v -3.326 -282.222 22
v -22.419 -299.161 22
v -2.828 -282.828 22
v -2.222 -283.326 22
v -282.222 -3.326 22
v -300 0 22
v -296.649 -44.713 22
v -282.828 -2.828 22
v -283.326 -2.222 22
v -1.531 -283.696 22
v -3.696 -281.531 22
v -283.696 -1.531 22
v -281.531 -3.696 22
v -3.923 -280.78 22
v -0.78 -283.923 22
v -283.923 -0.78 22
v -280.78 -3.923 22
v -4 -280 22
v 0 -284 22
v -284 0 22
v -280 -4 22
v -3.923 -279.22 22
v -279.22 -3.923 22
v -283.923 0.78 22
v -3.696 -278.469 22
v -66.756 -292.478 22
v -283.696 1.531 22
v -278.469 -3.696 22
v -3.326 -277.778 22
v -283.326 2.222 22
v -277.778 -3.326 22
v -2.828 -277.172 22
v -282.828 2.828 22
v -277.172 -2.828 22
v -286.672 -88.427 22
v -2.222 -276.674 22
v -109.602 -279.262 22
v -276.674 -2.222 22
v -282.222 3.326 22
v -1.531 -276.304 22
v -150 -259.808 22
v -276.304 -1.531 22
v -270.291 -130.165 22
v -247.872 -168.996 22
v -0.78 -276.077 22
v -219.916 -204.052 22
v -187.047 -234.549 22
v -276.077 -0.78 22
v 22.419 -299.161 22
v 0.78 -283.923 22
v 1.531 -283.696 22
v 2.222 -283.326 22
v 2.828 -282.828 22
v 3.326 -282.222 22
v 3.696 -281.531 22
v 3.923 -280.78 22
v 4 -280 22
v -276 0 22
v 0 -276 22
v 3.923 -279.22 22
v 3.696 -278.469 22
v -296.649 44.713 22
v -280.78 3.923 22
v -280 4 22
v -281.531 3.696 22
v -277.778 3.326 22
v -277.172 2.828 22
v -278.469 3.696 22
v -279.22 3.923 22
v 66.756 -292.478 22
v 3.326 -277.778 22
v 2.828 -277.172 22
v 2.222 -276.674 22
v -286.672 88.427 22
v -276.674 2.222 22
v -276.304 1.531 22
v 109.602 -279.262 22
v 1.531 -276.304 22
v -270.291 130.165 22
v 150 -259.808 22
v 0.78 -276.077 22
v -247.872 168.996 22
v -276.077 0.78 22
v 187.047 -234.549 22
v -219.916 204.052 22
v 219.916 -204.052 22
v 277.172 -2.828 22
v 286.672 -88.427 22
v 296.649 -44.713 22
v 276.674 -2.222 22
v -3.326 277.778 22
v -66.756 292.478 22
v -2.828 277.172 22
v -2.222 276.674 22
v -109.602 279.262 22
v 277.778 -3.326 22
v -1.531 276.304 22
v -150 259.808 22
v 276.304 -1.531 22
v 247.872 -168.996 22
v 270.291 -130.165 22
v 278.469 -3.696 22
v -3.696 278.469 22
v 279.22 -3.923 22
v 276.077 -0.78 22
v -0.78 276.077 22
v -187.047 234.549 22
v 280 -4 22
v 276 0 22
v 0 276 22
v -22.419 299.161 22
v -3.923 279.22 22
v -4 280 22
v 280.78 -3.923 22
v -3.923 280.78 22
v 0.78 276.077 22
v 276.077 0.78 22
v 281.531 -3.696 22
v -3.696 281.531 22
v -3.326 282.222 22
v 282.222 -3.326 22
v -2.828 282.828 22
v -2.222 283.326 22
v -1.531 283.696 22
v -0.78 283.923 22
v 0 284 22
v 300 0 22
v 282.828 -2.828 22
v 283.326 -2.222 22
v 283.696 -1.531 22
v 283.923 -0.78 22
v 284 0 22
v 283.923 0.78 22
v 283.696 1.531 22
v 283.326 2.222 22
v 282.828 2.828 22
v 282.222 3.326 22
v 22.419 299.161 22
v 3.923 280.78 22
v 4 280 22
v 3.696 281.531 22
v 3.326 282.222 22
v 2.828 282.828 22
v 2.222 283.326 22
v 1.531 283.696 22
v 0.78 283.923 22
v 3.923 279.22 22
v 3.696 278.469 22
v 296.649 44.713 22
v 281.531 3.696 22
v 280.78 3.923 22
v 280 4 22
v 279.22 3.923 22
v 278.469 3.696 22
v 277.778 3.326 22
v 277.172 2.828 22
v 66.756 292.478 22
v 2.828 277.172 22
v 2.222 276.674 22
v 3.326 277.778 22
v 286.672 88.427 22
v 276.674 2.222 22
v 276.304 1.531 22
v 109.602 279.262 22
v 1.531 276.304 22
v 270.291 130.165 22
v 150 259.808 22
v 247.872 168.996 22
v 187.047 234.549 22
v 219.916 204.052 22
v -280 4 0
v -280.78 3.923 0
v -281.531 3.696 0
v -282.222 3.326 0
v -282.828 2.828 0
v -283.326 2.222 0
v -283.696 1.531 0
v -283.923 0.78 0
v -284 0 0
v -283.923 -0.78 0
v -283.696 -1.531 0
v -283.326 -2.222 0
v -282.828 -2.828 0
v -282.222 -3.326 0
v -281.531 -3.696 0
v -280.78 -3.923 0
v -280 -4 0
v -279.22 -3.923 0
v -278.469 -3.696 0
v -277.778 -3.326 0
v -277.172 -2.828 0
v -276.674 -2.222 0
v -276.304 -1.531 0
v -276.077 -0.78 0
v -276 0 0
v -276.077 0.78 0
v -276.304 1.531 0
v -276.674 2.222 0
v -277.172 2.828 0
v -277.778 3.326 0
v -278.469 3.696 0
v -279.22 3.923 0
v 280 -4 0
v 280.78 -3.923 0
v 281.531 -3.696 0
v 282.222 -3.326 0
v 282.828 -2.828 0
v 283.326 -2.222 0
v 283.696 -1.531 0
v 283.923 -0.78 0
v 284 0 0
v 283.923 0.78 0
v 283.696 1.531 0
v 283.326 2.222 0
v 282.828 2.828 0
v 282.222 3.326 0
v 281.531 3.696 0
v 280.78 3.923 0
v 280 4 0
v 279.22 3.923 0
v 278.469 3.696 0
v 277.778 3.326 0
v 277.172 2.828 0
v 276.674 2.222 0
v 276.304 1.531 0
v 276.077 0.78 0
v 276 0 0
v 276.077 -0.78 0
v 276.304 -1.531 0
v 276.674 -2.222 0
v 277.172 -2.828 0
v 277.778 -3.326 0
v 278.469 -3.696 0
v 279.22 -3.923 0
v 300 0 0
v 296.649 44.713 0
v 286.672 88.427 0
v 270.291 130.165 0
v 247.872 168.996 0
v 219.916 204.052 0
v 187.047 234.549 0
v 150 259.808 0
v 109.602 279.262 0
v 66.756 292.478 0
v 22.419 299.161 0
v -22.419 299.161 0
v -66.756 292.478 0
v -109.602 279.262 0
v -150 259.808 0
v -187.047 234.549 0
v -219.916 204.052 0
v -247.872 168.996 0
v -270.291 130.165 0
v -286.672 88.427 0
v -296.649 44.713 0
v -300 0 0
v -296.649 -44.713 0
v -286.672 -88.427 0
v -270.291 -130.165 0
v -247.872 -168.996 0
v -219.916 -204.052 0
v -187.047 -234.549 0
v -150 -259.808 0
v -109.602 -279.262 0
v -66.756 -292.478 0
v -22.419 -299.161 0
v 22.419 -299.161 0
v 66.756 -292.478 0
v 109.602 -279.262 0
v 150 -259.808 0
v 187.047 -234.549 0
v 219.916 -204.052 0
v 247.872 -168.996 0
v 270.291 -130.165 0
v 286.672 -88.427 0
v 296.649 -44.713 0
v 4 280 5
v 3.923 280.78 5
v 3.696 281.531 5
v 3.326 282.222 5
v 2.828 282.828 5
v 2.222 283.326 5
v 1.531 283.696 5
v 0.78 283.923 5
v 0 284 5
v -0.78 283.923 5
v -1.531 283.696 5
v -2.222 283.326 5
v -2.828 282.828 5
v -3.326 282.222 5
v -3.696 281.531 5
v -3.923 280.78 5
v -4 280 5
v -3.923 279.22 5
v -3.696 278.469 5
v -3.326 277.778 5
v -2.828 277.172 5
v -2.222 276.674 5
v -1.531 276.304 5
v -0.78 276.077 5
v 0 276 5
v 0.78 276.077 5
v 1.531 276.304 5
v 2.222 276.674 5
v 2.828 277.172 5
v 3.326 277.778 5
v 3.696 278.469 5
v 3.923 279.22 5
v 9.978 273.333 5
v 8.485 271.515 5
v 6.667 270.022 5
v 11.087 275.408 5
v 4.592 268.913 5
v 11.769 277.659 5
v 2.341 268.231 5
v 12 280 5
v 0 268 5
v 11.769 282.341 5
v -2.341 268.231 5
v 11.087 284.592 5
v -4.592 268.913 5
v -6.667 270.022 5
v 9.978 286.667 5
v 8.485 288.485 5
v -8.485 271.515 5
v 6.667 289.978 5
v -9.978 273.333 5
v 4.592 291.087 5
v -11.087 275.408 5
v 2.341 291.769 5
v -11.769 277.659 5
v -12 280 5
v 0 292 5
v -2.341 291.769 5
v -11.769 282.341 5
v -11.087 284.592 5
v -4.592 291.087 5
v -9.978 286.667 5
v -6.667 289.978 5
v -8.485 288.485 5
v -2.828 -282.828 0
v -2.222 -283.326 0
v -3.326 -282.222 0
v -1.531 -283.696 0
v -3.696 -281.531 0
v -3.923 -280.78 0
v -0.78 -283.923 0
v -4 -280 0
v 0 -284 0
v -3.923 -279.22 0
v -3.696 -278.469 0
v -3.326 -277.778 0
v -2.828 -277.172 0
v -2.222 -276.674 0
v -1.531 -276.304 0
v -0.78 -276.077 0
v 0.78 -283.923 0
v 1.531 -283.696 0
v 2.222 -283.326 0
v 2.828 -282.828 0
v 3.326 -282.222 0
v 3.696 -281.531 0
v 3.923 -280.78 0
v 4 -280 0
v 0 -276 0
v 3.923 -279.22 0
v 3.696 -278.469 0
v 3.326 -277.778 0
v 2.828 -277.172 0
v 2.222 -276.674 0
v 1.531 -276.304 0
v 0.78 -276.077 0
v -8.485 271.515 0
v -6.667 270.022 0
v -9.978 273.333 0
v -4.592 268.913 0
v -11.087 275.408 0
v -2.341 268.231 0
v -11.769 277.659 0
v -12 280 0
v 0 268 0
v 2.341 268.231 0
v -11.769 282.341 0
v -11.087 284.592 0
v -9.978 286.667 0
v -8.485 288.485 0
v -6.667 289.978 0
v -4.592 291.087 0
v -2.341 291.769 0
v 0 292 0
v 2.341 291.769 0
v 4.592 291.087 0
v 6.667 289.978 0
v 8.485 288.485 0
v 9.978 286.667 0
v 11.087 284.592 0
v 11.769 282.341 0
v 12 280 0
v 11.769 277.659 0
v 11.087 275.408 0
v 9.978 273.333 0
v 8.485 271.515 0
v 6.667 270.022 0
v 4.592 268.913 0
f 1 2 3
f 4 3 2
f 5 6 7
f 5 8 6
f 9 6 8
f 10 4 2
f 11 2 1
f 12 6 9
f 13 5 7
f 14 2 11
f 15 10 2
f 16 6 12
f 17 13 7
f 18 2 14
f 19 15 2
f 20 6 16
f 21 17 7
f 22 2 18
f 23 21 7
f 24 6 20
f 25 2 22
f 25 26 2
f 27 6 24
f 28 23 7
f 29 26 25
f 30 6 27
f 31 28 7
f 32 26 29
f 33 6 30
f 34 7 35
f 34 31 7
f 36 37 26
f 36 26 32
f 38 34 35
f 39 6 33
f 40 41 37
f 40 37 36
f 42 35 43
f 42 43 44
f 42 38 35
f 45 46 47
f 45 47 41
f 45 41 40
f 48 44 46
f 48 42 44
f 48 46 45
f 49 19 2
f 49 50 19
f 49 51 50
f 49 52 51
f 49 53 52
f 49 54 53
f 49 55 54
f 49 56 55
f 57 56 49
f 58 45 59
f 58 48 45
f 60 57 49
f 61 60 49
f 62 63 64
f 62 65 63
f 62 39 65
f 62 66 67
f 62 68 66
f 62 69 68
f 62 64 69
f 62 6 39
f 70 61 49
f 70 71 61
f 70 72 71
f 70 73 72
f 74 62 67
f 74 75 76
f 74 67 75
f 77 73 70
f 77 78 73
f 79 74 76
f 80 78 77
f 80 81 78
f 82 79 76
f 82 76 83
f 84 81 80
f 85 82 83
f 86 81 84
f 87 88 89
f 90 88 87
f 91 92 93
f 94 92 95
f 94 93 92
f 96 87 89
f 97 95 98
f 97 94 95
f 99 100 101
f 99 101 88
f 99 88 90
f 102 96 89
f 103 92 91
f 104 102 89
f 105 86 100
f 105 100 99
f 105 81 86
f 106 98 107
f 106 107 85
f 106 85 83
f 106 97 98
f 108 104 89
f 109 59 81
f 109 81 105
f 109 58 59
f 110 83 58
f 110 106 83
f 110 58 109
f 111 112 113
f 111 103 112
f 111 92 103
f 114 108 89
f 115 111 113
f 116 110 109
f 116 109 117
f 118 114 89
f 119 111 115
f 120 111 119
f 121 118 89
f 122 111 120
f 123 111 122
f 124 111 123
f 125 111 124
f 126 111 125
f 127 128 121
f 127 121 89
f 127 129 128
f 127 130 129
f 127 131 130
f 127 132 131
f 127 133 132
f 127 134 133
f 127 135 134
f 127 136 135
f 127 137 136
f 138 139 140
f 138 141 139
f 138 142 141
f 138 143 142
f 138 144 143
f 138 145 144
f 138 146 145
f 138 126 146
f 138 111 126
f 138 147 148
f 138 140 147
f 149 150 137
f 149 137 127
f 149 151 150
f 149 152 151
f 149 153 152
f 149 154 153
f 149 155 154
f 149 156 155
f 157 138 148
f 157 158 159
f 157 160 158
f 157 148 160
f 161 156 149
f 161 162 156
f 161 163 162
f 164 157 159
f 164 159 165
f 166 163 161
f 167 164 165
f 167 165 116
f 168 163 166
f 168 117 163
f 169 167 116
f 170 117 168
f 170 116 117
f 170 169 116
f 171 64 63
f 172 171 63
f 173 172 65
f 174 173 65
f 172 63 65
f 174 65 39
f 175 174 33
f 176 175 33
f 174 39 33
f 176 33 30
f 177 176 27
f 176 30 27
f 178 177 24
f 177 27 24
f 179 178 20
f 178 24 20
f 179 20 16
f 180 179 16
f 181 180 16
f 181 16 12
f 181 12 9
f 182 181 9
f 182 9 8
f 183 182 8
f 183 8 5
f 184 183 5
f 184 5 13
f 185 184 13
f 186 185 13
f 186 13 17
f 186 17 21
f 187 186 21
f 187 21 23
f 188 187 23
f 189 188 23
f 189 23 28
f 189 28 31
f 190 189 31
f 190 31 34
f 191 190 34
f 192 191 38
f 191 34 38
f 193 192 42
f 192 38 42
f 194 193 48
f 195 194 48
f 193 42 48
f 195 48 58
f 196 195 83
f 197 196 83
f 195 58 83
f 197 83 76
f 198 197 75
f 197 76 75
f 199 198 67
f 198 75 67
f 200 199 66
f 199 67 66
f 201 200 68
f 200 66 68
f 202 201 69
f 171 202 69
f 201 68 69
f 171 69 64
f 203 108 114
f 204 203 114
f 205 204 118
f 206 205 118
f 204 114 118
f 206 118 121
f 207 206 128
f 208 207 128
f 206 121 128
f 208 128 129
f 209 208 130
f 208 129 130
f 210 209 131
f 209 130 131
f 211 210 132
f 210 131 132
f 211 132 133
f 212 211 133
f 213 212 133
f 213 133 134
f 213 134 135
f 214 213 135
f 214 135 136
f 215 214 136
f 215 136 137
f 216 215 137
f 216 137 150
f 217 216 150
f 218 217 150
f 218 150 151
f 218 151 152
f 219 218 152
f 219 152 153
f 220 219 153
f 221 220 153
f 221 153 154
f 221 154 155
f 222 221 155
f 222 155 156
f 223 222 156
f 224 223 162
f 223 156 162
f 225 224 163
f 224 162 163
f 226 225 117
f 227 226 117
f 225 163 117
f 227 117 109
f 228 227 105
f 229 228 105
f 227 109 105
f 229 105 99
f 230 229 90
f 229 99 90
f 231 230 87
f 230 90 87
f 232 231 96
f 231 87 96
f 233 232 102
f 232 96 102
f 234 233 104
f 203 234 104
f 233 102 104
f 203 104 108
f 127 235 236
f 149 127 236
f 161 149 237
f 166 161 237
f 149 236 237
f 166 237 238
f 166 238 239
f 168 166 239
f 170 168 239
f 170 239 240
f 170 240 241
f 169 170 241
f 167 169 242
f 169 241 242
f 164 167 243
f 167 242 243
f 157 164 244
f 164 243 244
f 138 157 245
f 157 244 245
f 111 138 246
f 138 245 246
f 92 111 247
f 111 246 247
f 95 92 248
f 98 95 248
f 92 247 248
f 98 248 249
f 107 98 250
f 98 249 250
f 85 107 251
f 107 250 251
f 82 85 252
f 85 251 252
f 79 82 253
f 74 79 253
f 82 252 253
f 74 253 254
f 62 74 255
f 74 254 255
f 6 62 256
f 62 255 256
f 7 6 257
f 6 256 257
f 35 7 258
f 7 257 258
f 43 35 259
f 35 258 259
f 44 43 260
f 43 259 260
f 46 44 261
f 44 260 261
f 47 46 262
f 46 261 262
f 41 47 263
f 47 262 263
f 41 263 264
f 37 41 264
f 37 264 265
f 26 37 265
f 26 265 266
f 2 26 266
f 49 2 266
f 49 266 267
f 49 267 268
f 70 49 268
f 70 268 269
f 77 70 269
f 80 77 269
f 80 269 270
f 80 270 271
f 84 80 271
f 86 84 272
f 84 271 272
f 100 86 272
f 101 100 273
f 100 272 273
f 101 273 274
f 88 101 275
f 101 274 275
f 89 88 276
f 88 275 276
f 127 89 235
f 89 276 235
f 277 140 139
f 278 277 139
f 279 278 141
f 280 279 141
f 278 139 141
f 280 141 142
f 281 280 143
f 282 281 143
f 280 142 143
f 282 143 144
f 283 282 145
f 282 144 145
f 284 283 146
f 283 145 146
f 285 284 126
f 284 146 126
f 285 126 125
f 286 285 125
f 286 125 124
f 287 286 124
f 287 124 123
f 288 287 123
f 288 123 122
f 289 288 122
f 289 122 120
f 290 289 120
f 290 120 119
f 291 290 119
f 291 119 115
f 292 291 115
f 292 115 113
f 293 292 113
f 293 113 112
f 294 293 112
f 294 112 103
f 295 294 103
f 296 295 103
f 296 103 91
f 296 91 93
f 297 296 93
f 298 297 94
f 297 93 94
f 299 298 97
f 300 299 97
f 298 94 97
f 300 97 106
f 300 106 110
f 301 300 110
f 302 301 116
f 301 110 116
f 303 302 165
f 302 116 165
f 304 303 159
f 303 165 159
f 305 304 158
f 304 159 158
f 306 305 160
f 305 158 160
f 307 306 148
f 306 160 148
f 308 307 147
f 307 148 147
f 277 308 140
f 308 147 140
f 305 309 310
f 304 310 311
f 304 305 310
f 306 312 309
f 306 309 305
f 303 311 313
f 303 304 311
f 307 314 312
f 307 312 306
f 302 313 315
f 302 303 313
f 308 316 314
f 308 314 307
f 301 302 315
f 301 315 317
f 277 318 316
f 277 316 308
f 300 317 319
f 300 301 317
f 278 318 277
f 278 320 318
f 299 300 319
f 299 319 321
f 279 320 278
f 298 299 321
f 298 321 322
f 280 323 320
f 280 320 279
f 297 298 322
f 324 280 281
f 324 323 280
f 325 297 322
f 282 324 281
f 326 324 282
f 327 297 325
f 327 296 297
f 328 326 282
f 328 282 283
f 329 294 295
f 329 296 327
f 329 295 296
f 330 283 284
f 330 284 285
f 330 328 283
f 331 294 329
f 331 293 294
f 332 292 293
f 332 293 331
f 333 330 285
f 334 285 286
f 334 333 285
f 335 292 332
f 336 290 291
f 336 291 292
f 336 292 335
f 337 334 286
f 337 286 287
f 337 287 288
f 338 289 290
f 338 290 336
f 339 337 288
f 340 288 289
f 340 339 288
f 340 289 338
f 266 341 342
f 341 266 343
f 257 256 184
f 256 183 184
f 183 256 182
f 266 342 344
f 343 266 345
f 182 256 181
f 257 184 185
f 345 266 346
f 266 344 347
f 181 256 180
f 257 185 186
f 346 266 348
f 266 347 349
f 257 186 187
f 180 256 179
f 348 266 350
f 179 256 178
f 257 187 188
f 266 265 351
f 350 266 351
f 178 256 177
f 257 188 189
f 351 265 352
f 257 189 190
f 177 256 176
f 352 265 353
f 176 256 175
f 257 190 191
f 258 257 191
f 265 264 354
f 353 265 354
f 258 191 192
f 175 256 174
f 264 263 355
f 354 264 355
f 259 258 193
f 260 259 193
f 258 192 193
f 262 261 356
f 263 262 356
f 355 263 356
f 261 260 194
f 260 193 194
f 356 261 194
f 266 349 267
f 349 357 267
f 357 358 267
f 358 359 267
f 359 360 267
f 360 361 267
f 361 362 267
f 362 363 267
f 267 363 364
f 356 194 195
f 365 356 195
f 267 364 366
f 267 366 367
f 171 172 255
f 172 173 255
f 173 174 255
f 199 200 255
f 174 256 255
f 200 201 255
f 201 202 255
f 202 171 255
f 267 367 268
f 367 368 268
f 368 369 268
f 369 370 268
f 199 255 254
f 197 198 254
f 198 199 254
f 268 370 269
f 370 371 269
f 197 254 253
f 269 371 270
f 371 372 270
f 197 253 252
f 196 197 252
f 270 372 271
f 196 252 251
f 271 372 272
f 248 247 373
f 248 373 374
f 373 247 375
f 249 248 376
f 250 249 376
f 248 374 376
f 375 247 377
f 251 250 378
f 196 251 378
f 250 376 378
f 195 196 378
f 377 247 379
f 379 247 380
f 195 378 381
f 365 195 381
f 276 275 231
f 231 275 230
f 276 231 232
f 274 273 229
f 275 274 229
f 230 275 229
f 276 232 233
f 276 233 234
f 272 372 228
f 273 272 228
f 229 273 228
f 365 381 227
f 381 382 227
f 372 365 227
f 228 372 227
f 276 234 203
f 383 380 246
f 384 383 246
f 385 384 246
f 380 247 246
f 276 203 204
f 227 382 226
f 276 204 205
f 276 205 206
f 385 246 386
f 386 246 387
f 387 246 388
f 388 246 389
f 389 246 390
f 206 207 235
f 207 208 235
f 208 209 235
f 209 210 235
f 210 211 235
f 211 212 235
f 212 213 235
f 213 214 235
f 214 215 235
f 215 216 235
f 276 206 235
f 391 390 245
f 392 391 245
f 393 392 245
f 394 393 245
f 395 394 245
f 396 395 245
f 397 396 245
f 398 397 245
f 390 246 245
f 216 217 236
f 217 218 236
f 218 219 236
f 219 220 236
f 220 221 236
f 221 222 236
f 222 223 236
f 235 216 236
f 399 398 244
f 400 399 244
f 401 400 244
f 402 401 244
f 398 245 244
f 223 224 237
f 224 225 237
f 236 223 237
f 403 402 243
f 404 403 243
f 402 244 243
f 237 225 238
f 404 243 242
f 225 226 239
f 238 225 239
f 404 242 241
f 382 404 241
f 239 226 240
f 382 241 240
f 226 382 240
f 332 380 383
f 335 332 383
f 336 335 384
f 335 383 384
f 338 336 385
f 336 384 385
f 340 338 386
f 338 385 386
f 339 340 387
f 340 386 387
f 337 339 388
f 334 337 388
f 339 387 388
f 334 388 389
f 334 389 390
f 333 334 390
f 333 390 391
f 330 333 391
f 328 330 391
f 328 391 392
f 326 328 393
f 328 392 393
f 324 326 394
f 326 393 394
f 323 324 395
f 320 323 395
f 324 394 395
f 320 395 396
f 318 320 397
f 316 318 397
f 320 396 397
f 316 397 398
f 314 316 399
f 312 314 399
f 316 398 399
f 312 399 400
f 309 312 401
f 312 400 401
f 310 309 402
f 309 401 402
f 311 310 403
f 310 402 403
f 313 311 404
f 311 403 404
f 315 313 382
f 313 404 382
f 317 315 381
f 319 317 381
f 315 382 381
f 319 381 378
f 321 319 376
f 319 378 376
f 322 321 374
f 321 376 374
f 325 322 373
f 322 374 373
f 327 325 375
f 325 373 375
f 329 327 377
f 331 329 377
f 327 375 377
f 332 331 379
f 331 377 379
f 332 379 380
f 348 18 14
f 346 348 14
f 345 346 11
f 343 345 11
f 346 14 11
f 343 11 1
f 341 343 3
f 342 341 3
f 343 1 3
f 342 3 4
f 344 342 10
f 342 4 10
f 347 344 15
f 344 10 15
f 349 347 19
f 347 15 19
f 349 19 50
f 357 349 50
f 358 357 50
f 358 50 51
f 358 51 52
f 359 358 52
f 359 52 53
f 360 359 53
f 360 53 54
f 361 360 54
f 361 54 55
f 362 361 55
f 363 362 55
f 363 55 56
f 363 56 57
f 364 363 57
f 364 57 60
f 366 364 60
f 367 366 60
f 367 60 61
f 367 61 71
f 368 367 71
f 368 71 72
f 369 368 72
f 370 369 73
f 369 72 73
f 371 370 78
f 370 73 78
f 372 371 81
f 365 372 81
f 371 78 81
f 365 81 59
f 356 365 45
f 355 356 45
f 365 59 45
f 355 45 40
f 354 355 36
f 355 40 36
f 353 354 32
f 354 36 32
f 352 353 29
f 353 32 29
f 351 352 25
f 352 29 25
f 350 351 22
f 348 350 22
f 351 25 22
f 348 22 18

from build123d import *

# Parameters (mm, degrees)
ESQUISSE1_R                  = 300
BOSS_EXTRU_1_DEPTH           = 22
ESQUISSE2_R                  = 4
ENL_V_MAT_EXTRU_1_DEPTH      = 23
R_P_TITION_CIRCULAIRE1_COUNT = 4
ESQUISSE4_R                  = 12
ENL_V_MAT_EXTRU_2_DEPTH      = 5


with BuildPart() as part:
    # Esquisse1 → Boss.-Extru.1 (new body)
    with BuildSketch(Plane.XY):
        Circle(ESQUISSE1_R)
    extrude(amount=BOSS_EXTRU_1_DEPTH)

    # Esquisse2 → Enlèv. mat.-Extru.1 (cut, through all)
    with BuildSketch(Plane.XY.offset(22)):
        with Locations((0, 280)):
            Circle(ESQUISSE2_R)
    enl_v_mat_extru_1 = extrude(amount=-ENL_V_MAT_EXTRU_1_DEPTH, mode=Mode.SUBTRACT)

    # Répétition circulaire1: Enlèv. mat.-Extru.1 ×4 about axis
    r_p_tition_circulaire1_axis = Axis((0, 0, 0), (0, 0, 1))
    for i in range(1, R_P_TITION_CIRCULAIRE1_COUNT):
        add(enl_v_mat_extru_1.rotate(r_p_tition_circulaire1_axis, i * 360 / R_P_TITION_CIRCULAIRE1_COUNT), mode=Mode.SUBTRACT)

    # Esquisse4 → Enlèv. mat.-Extru.2 (cut)
    with BuildSketch(Plane(origin=(0, 0, 0), x_dir=(-1, 0, 0), z_dir=(0, 0, -1))):
        with Locations((0, 280)):
            Circle(ESQUISSE4_R)
    extrude(amount=-ENL_V_MAT_EXTRU_2_DEPTH, mode=Mode.SUBTRACT)


solid = part.part
